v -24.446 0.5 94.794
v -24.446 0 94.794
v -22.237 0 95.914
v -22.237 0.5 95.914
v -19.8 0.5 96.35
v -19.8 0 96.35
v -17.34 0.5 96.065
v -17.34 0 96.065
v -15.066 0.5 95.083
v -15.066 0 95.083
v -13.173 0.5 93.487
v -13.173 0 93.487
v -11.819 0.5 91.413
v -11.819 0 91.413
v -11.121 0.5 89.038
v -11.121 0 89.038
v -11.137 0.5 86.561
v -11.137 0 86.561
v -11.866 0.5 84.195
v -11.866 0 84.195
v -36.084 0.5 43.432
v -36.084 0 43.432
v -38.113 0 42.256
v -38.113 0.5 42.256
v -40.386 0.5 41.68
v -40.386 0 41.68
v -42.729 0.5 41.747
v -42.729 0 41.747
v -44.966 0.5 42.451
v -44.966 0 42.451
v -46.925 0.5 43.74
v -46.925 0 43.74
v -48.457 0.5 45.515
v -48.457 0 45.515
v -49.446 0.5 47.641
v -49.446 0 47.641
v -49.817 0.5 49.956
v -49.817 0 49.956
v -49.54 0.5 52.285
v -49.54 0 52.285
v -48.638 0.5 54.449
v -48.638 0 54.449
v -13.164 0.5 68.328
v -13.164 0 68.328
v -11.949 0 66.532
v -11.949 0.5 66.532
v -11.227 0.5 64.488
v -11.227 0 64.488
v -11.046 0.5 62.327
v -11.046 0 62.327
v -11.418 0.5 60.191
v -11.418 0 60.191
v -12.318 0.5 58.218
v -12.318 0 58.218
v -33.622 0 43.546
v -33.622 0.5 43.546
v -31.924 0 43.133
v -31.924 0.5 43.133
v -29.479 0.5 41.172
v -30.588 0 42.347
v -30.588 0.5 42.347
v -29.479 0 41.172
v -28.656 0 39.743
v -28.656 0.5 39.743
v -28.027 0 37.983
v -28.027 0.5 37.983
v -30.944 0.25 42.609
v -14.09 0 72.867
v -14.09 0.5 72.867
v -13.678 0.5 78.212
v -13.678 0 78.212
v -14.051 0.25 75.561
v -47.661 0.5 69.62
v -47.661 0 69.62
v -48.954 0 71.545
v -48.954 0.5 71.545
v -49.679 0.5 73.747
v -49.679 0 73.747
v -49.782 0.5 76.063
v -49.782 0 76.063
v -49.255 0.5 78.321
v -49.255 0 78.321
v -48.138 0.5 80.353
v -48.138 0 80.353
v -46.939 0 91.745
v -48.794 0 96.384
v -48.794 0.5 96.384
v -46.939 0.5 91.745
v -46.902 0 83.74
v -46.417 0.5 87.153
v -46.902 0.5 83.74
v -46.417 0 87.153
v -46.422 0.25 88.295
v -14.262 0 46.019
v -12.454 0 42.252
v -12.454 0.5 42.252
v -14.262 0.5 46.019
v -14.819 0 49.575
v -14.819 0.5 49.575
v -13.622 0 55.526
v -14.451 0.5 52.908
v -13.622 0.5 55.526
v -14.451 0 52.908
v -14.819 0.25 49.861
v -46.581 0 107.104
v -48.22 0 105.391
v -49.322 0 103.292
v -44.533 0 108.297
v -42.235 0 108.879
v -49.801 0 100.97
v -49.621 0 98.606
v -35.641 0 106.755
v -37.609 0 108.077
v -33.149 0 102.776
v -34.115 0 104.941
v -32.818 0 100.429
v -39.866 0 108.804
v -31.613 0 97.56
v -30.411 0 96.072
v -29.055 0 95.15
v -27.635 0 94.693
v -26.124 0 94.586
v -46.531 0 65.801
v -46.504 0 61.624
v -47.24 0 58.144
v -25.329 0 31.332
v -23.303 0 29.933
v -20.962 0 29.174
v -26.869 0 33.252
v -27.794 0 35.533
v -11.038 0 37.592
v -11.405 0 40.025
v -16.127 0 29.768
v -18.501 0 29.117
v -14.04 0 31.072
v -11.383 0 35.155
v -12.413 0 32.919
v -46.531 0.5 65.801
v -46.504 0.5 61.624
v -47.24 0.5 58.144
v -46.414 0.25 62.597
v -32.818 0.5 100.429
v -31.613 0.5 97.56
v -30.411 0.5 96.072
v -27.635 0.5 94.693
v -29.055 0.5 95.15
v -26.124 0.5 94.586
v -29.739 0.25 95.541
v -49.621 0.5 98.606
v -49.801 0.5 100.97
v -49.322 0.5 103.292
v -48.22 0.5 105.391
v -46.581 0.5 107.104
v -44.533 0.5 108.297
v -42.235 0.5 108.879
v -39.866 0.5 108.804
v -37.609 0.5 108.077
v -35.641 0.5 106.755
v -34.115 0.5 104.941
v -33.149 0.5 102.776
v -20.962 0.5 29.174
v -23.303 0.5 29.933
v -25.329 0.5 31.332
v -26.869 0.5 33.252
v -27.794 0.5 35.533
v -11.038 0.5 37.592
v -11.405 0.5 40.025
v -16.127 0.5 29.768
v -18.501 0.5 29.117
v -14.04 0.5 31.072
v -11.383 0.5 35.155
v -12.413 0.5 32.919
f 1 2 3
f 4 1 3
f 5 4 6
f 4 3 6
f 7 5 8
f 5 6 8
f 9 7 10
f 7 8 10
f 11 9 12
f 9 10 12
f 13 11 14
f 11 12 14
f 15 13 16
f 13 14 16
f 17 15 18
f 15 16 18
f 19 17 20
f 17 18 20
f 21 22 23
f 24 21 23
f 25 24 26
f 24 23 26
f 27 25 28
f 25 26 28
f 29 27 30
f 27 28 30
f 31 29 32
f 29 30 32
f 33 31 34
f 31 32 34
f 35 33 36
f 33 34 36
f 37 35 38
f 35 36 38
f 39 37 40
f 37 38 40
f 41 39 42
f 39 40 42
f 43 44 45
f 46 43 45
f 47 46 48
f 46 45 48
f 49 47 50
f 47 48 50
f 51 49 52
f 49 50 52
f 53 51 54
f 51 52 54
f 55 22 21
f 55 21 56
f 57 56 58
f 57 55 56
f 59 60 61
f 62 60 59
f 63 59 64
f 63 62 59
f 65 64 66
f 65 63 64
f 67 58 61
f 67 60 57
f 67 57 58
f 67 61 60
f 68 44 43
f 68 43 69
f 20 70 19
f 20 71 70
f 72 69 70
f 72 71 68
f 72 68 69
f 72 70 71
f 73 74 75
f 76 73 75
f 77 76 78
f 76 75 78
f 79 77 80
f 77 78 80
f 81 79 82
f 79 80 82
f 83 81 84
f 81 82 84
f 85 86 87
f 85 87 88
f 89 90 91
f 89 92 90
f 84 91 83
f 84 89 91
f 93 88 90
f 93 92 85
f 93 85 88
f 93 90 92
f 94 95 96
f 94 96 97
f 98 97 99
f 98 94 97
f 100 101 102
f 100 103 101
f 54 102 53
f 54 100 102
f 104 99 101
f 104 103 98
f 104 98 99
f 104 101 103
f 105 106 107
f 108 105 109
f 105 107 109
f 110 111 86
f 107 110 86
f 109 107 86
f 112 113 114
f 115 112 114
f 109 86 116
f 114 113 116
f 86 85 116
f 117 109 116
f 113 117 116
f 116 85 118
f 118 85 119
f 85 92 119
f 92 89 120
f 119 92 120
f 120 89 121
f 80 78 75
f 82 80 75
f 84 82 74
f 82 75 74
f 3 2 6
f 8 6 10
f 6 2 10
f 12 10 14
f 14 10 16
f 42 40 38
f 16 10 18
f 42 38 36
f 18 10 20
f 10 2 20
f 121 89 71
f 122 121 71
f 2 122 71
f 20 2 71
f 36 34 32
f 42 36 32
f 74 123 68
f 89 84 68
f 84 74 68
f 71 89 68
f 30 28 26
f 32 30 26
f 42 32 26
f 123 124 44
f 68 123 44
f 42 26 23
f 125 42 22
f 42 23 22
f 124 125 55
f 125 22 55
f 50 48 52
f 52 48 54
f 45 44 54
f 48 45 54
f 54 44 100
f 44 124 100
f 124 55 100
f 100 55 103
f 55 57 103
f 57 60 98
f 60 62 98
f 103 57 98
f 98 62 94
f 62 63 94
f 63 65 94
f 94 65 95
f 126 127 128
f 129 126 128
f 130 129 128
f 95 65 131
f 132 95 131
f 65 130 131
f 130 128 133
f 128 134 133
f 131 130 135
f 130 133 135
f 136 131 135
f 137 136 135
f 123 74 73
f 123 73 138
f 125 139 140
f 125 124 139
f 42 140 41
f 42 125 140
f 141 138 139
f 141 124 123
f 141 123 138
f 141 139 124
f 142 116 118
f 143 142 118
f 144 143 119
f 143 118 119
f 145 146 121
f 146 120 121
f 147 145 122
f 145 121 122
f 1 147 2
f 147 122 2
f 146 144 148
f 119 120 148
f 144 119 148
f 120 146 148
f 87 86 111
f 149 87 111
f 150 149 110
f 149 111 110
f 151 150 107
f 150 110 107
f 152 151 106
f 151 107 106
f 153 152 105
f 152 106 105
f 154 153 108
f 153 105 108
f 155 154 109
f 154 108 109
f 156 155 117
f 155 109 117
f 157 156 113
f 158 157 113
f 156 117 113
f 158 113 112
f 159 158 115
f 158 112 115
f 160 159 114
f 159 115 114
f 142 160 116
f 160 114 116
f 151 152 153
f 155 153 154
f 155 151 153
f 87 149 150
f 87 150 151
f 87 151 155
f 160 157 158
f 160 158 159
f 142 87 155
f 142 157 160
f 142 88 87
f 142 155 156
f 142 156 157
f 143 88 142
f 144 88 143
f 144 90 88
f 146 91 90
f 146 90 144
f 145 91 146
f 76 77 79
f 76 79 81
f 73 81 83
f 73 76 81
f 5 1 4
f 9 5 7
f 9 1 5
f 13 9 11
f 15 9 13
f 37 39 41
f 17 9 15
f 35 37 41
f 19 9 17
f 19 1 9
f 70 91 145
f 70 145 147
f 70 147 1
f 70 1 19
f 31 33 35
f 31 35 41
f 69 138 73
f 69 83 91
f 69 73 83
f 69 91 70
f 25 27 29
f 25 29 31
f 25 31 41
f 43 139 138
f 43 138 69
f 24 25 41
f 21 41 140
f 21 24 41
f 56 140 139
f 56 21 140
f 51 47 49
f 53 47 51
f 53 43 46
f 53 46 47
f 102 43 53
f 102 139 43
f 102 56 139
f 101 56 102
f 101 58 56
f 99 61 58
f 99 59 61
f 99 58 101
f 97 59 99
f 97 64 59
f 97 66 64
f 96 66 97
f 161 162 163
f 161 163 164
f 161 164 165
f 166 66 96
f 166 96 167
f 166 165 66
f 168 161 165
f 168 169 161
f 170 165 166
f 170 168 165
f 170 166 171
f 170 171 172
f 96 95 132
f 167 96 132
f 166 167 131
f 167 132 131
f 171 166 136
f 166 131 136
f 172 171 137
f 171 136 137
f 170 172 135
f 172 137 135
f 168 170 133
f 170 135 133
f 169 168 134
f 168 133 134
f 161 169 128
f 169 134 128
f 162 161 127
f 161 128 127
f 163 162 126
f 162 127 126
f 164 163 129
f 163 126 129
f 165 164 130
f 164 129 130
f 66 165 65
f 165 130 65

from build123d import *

# Parameters (mm, degrees)
BOSS_EXTRUDE2_DEPTH = 0.5


with BuildPart() as part:
    # Sketch3 → Boss-Extrude2 (new body)
    with BuildSketch(Plane(origin=(0, 0, 0), x_dir=(1, 0, 0), z_dir=(0, 1, 0))):
        with BuildLine():
            ThreePointArc((-36.083785498, -43.43174801), (-46.924843817, -43.7399727), (-48.638393243, -54.449188186))
            add(Edge.make_bspline(
                [(-47.6612581, -69.620420628), (-44.67786304, -63.159473941), (-48.638393243, -54.449188186)],
                knots=[0, 0, 0, 1, 1, 1], degree=2))
            ThreePointArc((-47.6612581, -69.620420628), (-49.809928396, -74.901781564), (-48.13770816, -80.352766508))
            add(Edge.make_bspline(
                [(-48.794359492, -96.384204212), (-44.378776707, -88.222316074), (-48.13770816, -80.352766508)],
                knots=[0, 0, 0, 1, 1, 1], degree=2))
            ThreePointArc((-48.794359492, -96.384204212), (-43.404368002, -108.668799602), (-32.818291991, -100.428757923))
            add(Edge.make_bspline(
                [(-32.818291991, -100.428757923), (-30.846947347, -93.47063926), (-24.445798858, -94.793576843)],
                knots=[0, 0, 0, 1, 1, 1], degree=2))
            ThreePointArc((-24.445798858, -94.793576843), (-14.061121236, -94.354258183), (-11.865583386, -84.19482199))
            add(Edge.make_bspline(
                [(-13.164422653, -68.327872009), (-15.58680525, -74.860973905), (-11.865583386, -84.19482199)],
                knots=[0, 0, 0, 1, 1, 1], degree=2))
            ThreePointArc((-13.164422653, -68.327872009), (-11.067400095, -63.413067651), (-12.317814786, -58.217947961))
            add(Edge.make_bspline(
                [(-12.454215604, -42.252001936), (-17.252491187, -49.486356904), (-12.317814786, -58.217947961)],
                knots=[0, 0, 0, 1, 1, 1], degree=2))
            ThreePointArc((-12.454215604, -42.252001936), (-17.290607023, -29.356176902), (-28.026899399, -37.983170079))
            add(Edge.make_bspline(
                [(-36.083785498, -43.43174801), (-29.83167631, -44.511236738), (-28.026899399, -37.983170079)],
                knots=[0, 0, 0, 1, 1, 1], degree=2))
        make_face()
    extrude(amount=BOSS_EXTRUDE2_DEPTH)


solid = part.part
